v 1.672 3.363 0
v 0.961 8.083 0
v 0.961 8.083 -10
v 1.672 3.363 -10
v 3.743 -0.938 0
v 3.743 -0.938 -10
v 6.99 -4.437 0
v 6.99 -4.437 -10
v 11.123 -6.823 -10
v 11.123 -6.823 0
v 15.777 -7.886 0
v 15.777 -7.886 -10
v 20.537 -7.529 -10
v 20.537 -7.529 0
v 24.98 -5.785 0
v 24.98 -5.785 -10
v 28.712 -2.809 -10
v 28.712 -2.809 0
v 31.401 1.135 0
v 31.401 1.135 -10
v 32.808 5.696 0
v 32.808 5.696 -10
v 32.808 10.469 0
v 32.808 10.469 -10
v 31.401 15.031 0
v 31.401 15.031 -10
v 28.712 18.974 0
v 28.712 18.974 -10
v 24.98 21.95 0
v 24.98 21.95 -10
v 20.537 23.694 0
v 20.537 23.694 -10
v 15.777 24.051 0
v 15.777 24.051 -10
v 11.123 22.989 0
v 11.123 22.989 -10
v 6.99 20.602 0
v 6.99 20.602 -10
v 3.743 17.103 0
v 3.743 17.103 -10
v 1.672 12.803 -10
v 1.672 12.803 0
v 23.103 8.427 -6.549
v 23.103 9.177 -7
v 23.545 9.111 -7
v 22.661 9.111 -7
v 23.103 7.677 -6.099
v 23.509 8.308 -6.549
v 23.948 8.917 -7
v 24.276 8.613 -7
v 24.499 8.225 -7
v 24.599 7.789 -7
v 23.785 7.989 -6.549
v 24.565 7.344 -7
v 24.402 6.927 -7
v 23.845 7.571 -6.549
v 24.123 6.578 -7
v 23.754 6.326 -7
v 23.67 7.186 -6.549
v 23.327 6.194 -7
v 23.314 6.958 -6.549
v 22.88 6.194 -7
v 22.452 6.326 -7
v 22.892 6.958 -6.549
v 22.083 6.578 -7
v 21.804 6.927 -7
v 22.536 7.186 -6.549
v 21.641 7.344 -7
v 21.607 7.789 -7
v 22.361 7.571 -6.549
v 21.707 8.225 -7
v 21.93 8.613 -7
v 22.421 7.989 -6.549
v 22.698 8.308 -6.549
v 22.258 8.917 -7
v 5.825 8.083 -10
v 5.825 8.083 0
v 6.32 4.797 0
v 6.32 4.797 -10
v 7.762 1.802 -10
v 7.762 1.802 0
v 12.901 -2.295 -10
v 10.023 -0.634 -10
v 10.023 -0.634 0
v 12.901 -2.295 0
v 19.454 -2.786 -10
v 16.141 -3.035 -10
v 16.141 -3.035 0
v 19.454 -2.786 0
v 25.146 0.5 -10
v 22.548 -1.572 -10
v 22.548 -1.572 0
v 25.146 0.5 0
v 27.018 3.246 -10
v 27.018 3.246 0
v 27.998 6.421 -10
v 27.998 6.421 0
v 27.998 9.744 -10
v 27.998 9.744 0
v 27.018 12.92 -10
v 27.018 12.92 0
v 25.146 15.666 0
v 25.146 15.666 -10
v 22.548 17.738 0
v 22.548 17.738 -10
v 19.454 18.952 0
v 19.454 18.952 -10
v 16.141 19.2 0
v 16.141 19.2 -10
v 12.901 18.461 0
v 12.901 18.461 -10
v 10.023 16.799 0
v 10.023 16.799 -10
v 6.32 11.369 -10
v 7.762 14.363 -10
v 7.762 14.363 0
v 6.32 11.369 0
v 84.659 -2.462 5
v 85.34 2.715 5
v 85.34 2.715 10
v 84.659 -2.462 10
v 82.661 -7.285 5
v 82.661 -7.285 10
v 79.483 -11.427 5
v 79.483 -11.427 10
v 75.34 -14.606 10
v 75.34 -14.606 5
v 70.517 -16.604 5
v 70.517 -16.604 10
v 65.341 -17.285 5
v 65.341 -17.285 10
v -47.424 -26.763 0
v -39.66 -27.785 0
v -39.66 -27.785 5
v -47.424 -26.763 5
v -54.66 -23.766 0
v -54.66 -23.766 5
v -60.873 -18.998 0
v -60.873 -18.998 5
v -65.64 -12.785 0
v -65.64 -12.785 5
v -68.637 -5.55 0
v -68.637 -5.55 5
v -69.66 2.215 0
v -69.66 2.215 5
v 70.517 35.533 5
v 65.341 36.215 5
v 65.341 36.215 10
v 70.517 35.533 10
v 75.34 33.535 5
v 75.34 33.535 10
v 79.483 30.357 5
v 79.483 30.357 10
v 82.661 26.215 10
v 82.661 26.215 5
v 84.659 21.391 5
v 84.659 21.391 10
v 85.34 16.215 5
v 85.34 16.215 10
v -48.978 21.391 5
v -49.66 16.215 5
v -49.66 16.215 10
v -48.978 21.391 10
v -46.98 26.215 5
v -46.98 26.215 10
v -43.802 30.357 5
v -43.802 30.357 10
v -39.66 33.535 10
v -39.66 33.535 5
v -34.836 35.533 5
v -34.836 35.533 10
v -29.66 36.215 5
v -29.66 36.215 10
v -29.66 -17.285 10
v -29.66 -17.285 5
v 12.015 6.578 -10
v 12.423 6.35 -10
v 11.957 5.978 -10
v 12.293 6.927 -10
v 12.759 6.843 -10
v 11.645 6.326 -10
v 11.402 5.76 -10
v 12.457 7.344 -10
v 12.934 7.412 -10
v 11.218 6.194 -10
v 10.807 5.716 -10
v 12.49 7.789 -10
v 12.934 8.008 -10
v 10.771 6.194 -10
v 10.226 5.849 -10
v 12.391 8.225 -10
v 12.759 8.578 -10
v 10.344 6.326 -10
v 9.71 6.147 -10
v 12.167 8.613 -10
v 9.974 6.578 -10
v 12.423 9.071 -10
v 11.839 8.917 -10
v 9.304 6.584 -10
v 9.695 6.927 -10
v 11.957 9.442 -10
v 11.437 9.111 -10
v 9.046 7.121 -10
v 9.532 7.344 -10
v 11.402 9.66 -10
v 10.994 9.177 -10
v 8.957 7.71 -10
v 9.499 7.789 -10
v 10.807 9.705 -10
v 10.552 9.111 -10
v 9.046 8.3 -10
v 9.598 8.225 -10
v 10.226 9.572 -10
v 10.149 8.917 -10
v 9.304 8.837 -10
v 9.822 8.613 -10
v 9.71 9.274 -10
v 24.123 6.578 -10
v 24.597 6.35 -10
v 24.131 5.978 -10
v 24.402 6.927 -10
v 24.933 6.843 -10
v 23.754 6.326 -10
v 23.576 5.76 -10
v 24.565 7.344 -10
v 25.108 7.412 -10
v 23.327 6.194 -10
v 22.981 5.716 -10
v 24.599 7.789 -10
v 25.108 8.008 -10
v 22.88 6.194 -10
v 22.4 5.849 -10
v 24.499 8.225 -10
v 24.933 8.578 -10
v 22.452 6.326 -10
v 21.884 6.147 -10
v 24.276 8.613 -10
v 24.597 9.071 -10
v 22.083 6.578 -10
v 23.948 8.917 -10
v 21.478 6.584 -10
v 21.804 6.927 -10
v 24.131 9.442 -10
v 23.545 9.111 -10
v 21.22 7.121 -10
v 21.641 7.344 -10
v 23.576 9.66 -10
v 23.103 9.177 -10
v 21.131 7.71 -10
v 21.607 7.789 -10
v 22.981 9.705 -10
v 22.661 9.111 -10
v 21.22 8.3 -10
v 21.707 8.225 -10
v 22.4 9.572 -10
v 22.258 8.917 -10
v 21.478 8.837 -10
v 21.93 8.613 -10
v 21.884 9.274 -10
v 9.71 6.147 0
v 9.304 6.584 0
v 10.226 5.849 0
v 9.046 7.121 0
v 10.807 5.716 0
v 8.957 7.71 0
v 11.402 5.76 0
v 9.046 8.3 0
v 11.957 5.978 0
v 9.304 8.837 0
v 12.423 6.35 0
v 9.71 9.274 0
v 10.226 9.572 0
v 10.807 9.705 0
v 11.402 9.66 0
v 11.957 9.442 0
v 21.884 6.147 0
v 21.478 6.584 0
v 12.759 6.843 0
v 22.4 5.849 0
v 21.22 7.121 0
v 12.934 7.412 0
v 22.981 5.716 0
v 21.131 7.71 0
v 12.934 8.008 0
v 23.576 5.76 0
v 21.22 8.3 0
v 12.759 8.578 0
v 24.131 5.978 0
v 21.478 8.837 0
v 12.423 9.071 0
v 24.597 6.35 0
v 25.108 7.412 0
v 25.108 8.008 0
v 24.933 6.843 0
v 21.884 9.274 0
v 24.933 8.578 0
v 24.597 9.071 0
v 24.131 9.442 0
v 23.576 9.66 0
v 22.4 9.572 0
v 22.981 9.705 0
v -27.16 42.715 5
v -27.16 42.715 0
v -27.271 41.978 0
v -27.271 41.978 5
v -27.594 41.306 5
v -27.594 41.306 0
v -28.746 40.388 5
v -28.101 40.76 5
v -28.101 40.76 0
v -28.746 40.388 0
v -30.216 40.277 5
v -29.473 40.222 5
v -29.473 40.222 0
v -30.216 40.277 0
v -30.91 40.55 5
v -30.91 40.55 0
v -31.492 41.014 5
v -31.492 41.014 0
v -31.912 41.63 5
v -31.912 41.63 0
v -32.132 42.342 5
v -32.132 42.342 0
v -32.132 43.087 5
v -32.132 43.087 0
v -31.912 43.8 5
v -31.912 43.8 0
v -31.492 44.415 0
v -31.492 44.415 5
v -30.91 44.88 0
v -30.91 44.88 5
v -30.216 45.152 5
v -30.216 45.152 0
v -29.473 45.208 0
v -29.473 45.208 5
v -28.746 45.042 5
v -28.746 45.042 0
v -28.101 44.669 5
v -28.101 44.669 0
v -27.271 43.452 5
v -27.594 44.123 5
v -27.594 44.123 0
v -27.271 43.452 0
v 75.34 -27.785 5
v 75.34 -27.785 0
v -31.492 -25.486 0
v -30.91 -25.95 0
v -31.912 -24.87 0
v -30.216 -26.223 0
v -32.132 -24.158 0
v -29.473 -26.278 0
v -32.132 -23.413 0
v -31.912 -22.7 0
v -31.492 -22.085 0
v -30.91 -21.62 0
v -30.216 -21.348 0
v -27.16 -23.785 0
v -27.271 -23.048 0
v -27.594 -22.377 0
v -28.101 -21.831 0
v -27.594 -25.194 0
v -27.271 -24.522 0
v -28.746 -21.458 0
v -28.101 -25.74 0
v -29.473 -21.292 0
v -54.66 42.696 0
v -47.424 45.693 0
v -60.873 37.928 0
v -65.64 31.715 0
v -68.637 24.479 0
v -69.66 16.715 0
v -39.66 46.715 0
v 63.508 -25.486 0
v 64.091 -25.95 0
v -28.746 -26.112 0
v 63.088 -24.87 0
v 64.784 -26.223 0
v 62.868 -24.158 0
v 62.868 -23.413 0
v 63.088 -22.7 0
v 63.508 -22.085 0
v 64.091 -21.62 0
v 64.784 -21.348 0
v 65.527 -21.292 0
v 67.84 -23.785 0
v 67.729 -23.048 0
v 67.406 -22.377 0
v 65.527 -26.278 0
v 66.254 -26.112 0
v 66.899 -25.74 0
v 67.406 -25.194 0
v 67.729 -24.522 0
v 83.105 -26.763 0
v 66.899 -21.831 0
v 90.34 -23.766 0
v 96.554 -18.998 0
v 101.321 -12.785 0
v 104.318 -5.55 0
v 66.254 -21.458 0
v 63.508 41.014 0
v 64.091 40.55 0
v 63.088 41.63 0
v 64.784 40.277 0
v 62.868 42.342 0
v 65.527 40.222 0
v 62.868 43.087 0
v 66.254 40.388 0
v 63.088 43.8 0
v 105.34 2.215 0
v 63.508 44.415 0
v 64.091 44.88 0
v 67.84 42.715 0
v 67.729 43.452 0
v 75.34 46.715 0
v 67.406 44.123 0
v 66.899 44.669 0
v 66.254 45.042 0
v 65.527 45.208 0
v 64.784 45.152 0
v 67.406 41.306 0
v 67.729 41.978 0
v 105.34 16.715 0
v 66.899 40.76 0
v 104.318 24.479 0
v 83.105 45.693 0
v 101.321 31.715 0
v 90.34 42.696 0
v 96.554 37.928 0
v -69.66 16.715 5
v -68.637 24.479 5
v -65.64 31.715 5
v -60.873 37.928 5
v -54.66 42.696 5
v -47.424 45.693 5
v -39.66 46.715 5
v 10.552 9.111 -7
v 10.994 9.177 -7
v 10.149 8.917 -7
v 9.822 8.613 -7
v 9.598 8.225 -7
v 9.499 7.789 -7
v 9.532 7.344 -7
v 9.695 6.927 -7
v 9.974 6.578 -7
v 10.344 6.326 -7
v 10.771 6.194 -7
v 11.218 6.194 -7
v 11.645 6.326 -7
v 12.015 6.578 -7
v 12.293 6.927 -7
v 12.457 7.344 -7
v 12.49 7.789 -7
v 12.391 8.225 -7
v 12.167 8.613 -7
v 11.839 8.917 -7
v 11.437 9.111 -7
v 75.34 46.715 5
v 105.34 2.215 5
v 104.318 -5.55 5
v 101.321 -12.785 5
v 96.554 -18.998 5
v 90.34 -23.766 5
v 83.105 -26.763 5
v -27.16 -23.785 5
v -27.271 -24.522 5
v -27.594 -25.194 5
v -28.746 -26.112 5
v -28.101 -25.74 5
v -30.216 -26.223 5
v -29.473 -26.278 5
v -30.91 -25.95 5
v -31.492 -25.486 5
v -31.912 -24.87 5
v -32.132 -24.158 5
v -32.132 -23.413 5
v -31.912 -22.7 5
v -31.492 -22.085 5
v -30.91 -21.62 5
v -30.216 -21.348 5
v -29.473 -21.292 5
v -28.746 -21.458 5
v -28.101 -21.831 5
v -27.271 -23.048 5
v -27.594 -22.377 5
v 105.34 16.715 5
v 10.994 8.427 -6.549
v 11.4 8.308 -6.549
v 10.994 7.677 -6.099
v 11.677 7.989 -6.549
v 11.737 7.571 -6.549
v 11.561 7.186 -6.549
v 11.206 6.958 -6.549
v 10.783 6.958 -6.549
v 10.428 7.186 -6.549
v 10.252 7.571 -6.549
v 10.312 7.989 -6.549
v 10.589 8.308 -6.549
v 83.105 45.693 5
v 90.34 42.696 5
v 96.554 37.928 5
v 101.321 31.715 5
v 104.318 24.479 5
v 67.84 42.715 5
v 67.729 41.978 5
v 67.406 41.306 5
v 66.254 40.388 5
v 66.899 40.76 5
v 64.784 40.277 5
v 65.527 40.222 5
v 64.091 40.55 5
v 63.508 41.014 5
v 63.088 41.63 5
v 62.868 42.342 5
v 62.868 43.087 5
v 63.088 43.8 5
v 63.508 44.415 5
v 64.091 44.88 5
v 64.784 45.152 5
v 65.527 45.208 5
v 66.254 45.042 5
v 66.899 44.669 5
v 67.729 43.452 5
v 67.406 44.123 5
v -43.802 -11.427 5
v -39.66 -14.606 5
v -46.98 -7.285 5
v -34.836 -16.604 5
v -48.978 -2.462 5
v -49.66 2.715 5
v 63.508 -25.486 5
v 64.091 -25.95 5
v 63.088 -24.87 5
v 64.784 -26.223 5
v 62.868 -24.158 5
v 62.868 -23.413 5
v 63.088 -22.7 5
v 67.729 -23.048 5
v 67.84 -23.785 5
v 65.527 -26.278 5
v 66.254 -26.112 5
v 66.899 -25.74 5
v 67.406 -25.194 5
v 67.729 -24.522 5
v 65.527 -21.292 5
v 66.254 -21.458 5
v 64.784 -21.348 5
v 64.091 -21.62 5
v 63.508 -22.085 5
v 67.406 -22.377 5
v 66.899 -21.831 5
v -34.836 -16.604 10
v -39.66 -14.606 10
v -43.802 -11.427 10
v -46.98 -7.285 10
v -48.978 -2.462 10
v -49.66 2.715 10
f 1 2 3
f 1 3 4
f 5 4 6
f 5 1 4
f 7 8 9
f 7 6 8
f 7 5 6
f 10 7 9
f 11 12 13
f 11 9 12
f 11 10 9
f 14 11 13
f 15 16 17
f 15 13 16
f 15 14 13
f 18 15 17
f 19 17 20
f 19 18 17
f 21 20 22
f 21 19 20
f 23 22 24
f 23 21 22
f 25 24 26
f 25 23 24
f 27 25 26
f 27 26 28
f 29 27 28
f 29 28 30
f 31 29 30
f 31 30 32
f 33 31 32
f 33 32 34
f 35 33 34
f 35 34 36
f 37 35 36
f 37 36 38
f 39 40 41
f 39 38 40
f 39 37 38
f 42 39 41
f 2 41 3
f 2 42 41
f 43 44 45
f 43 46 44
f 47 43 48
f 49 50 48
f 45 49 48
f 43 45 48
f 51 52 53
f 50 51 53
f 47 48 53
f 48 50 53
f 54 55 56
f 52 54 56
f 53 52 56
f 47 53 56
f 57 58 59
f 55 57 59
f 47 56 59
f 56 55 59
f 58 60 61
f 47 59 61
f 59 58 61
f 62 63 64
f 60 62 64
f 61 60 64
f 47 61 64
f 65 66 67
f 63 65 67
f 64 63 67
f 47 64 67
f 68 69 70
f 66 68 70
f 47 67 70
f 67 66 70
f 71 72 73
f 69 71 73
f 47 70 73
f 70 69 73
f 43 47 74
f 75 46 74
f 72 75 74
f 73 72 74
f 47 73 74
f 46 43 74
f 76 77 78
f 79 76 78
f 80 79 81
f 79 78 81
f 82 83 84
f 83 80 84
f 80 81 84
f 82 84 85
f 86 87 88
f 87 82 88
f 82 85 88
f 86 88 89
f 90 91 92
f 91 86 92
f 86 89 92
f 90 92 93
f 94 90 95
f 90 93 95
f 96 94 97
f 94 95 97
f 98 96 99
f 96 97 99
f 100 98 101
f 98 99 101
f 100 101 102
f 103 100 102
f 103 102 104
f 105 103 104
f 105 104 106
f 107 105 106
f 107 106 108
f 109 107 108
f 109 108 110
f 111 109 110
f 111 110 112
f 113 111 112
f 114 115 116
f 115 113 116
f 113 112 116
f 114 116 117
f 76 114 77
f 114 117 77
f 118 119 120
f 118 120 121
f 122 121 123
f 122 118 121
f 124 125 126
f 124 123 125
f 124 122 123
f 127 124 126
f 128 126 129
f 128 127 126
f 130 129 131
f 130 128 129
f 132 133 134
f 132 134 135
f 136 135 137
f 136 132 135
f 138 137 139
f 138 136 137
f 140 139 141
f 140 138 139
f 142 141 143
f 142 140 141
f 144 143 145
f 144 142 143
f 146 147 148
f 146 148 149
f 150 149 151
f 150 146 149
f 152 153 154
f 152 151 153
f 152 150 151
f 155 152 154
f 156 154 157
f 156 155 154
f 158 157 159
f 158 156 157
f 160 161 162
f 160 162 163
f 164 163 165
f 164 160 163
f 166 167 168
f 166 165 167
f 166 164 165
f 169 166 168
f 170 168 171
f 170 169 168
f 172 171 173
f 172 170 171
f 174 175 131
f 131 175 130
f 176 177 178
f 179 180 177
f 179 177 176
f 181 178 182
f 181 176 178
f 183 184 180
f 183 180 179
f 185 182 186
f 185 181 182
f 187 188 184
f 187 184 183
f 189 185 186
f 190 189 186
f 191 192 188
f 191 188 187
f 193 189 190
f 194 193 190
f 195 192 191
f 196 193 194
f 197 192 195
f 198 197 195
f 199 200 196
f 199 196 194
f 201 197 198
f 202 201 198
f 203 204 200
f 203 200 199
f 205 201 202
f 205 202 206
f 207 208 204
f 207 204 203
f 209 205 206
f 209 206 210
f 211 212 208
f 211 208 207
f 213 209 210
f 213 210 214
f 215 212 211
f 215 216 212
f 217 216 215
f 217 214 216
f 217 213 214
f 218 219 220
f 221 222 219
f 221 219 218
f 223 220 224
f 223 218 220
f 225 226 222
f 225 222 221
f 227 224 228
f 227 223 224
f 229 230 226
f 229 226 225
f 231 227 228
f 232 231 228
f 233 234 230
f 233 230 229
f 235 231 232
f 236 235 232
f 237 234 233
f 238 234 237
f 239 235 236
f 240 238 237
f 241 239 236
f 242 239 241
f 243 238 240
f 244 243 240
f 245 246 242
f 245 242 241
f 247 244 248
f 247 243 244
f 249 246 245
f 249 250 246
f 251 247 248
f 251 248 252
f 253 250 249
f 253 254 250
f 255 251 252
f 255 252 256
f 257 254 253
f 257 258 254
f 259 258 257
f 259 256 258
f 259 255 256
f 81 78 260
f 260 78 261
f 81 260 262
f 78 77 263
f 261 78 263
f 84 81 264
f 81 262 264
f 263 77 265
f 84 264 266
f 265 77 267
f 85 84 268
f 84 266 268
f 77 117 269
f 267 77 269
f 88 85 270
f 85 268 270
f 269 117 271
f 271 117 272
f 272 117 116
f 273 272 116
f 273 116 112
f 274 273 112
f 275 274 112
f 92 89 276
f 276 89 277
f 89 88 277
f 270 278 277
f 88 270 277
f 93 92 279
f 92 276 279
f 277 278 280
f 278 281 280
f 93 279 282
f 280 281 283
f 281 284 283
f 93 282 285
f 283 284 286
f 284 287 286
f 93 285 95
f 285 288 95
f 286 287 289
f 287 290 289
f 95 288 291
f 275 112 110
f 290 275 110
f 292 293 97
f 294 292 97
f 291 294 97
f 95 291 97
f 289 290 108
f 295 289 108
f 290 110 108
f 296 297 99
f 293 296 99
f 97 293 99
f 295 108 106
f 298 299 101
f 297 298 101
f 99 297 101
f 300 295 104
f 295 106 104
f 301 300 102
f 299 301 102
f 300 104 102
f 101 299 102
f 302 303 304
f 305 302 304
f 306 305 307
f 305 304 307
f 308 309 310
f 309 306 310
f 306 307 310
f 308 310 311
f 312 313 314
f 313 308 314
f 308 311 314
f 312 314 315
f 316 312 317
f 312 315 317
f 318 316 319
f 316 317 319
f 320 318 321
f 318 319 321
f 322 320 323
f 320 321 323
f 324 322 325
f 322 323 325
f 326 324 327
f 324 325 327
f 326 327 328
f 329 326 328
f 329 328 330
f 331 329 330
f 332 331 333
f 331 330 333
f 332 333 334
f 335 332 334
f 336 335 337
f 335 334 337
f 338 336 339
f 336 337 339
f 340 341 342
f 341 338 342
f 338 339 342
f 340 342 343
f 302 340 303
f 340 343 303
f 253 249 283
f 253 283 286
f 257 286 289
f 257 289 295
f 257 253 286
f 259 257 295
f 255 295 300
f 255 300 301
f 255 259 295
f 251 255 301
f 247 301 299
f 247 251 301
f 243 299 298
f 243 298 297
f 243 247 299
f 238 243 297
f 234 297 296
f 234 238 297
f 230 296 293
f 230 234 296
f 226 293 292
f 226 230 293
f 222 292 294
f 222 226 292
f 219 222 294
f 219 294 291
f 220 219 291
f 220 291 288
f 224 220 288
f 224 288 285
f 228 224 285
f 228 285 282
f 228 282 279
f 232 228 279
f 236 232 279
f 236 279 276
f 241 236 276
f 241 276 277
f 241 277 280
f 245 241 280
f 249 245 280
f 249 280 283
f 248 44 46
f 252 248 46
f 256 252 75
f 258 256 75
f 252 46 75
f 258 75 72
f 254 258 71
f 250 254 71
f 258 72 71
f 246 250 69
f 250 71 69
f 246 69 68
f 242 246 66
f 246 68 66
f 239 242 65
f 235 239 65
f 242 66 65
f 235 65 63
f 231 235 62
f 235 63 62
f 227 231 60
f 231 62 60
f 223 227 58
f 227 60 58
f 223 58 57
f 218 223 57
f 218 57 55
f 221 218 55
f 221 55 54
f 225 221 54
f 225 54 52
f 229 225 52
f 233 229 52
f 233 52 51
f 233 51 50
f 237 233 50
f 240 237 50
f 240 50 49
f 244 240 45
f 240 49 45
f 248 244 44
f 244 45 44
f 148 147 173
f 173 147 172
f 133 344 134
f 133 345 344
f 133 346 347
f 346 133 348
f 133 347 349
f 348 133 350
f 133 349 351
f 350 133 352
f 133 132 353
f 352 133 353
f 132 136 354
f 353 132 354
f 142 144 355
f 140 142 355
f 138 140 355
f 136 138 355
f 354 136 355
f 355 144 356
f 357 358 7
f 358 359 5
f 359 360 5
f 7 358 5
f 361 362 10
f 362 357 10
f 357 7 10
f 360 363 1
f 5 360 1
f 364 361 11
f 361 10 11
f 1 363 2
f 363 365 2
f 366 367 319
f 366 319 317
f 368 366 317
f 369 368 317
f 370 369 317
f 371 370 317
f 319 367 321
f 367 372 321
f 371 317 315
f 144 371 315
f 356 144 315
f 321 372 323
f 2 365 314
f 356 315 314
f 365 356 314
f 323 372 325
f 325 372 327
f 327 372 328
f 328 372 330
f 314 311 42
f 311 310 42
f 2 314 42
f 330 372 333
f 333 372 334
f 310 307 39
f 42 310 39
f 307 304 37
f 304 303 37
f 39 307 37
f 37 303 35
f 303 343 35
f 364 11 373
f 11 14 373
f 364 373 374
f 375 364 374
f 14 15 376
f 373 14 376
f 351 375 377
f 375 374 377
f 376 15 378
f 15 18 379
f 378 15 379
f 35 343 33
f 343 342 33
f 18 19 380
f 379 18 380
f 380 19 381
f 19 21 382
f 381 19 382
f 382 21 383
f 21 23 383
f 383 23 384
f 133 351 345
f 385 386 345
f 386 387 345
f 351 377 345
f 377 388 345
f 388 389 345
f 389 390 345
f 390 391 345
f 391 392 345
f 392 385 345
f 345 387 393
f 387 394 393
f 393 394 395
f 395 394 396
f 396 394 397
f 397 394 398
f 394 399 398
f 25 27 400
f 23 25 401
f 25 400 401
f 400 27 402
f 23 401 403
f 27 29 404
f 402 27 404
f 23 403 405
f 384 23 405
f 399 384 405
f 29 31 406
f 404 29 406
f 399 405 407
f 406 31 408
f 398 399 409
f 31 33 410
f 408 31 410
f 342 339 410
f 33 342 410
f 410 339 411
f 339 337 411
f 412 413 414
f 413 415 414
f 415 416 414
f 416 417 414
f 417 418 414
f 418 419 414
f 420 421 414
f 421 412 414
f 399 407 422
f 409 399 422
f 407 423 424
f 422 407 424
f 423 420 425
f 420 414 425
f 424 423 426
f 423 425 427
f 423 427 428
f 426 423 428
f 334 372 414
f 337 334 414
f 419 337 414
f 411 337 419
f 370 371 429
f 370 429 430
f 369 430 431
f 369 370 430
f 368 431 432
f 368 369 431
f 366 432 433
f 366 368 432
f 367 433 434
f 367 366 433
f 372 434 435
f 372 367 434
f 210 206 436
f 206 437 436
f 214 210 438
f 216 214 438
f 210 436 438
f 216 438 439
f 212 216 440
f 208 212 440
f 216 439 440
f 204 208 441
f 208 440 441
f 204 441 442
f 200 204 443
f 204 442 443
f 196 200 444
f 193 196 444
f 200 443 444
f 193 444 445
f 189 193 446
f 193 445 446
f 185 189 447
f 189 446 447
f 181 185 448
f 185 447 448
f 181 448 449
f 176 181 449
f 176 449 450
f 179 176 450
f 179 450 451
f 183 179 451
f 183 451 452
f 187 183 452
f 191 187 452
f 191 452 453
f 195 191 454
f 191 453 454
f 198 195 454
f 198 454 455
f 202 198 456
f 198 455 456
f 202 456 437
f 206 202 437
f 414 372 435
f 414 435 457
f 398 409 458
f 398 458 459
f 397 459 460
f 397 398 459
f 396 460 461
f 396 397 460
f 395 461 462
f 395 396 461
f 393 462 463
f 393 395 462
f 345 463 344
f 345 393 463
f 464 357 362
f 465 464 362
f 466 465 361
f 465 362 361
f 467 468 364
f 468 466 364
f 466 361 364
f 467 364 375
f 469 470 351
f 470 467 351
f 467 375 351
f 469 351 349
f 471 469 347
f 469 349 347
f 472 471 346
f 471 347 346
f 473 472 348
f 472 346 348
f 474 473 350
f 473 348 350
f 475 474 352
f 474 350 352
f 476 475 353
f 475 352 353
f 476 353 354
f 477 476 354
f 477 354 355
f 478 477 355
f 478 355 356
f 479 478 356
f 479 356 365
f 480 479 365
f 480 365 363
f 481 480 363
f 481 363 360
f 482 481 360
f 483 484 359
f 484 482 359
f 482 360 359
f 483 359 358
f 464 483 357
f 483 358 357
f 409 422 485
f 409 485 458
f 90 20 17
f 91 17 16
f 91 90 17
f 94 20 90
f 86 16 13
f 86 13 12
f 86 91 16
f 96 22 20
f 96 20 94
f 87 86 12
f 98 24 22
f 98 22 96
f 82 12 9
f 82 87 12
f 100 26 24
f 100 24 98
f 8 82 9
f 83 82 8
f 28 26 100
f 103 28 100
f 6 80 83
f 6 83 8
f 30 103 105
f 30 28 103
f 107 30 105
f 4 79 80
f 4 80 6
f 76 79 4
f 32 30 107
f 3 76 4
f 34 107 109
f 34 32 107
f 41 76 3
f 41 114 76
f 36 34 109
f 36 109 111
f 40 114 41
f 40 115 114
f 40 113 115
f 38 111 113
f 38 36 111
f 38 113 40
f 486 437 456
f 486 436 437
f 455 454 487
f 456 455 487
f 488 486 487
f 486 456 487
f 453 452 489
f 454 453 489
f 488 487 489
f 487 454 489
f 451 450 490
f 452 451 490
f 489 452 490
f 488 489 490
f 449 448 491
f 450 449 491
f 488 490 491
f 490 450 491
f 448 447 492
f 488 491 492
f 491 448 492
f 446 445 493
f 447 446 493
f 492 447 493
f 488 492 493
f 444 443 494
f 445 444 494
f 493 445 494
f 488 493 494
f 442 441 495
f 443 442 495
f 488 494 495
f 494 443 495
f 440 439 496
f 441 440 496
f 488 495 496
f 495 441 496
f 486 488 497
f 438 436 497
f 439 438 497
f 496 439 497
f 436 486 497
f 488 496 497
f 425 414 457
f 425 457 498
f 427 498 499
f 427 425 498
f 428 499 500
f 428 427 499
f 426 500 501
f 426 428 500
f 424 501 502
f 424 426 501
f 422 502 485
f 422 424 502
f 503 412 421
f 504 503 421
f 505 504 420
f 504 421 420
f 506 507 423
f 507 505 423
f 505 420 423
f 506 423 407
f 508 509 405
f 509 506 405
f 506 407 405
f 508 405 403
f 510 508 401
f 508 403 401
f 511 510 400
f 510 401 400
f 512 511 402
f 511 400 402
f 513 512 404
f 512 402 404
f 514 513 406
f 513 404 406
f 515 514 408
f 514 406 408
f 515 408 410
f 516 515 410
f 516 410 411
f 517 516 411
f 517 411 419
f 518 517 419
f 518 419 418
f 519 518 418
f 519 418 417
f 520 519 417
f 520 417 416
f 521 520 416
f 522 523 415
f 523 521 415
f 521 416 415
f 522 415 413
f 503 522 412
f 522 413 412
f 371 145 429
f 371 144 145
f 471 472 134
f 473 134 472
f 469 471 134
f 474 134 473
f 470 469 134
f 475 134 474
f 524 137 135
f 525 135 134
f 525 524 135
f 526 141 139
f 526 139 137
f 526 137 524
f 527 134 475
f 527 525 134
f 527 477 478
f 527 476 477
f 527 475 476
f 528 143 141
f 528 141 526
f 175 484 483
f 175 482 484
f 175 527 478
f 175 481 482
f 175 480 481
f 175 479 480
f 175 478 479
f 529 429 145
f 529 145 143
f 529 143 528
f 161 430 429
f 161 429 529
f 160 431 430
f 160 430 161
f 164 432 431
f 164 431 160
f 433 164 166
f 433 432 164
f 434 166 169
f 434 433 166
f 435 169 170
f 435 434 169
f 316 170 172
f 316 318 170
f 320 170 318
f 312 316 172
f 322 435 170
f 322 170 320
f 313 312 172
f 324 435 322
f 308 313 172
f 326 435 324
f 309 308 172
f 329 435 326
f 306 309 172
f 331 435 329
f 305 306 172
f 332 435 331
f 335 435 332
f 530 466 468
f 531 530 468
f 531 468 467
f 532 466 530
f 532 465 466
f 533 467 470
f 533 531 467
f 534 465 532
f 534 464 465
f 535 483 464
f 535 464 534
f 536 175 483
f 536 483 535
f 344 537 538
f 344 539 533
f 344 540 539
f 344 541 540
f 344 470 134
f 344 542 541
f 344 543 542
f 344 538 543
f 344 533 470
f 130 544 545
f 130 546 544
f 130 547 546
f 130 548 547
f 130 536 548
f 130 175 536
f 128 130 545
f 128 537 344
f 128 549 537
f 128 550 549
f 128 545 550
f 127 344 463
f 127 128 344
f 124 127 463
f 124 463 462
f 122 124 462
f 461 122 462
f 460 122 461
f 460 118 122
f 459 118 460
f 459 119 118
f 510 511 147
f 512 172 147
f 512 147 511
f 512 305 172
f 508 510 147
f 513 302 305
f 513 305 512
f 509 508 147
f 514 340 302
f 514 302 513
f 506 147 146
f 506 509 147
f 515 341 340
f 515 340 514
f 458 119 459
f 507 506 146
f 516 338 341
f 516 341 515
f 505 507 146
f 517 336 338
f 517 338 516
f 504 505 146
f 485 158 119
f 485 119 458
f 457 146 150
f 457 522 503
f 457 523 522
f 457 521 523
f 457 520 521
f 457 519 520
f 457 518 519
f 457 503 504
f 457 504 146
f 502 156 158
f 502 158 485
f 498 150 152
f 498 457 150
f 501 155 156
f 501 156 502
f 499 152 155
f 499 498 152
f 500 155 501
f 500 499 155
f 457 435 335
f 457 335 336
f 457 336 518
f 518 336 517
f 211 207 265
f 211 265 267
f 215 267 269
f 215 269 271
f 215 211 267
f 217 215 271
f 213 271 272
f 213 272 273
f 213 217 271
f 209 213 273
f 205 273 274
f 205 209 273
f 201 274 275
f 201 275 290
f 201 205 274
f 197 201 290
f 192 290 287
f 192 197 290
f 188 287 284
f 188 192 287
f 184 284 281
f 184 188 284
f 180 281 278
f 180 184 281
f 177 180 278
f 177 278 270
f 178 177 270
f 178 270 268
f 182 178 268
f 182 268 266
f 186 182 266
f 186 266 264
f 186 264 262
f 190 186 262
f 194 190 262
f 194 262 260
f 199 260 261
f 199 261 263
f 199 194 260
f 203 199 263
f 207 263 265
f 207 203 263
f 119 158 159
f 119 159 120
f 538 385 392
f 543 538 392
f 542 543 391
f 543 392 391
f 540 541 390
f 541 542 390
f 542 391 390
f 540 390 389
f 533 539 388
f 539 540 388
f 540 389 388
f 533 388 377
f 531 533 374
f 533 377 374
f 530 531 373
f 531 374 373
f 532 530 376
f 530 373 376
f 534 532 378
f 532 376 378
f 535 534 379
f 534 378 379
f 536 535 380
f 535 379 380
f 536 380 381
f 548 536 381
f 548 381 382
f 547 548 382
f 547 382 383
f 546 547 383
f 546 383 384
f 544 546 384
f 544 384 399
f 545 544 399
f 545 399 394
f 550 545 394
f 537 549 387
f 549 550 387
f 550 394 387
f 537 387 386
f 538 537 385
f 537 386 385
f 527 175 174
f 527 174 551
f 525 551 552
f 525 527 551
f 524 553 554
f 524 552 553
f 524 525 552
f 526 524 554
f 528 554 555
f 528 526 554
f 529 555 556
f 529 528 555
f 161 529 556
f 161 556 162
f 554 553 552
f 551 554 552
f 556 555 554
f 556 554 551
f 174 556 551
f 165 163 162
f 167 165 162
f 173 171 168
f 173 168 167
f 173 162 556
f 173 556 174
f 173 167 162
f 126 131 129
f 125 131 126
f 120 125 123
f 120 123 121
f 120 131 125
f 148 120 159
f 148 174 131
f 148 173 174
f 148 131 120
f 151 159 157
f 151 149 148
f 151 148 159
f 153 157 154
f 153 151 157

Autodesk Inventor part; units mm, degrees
ref_plane "YZ Plane" through (0, 0, 0) normal (1, 0, 0) x (0, 1, 0)
ref_plane "XZ Plane" through (0, 0, 0) normal (0, 1, 0) x (-1, 0, 0)
ref_plane "XY Plane" through (0, 0, 0) normal (0, 0, 1) x (1, 0, 0)
sketch "Esboço1" plane through (0, 0, 0) normal (0, 0, 1) x (1, 0, 0)
  line L0 (-29.6595, 42.7148) -> (-29.6595, -23.7852) construction
  line L1 (-29.6595, 42.7148) -> (65.3405, 42.7148) construction
  line L2 (65.3405, 42.7148) -> (65.3405, -23.7852) construction
  line L3 (65.3405, -23.7852) -> (-29.6595, -23.7852) construction
  circle A0 centre (65.3405, 42.7148) radius 2.5
  circle A1 centre (65.3405, -23.7852) radius 2.5
  circle A2 centre (-29.6595, 42.7148) radius 2.5
  circle A3 centre (-29.6595, -23.7852) radius 2.5
  line L4 (65.3405, 42.7148) -> (65.3405, 46.7148) construction
  line L5 (65.3405, 46.7148) -> (-29.6595, 46.7148) construction
  line L6 (-29.6595, 46.7148) -> (-29.6595, 42.7148) construction
  line L7 (65.3405, -23.7852) -> (65.3405, -27.7852) construction
  line L8 (65.3405, -27.7852) -> (-29.6595, -27.7852) construction
  line L9 (-29.6595, -27.7852) -> (-29.6595, -23.7852) construction
  line L10 (17.8405, 42.7148) -> (-37.1595, 42.7148) construction
  line L11 (17.8405, 42.7148) -> (72.8405, 42.7148) construction
  line L12 (17.8405, -23.7852) -> (-47.1595, -23.7852) construction
  line L13 (17.8405, -23.7852) -> (62.8405, -23.7852) construction
  line L14 (-29.6595, 46.7148) -> (-69.6595, 46.7148) construction
  line L15 (65.3405, -27.7852) -> (105.3405, -27.7852) construction
  line L16 (-39.6595, 46.7148) -> (75.3405, 46.7148)
  line L17 (105.3405, 16.7148) -> (105.3405, 2.2148)
  line L18 (75.3405, -27.7852) -> (-39.6595, -27.7852)
  line L19 (-69.6595, 2.2148) -> (-69.6595, 16.7148)
  arc A4 (-39.6595, 46.7148) -> (-69.6595, 16.7148) centre (-39.6595, 16.7148) ccw
  arc A5 (-69.6595, 2.2148) -> (-39.6595, -27.7852) centre (-39.6595, 2.2148) ccw
  arc A6 (105.3405, 16.7148) -> (75.3405, 46.7148) centre (75.3405, 16.7148) ccw
  arc A7 (75.3405, -27.7852) -> (105.3405, 2.2148) centre (75.3405, 2.2148) ccw
  dimension "d16" = 66.5
  dimension "d19" = 5
  dimension "d20" = 4
  dimension "d21" = 4
  dimension "d22" = 55
  dimension "d23" = 55
  dimension "d24" = 40
  dimension "d25" = 40
  dimension "d26" = 30
  dimension "d27" = 30
extrude "Extrusão1" add sketch "Esboço1" along normal blind 5
sketch "Esboço2" plane through (0, 0, 5) normal (0, 0, 1) x (1, 0, 0)
  circle A0 centre (-29.6595, 42.7148) radius 2.5 construction
  line L0 (-29.6595, 40.2148) -> (-29.6595, 36.2148) construction
  circle A1 centre (65.3405, -23.7852) radius 2.5 construction
  line L1 (65.3405, -21.2852) -> (65.3405, -17.2852) construction
  line L2 (-29.6595, 36.2148) -> (-29.6595, 36.2148) construction
  line L3 (65.3405, -17.2852) -> (65.3405, -17.2852) construction
  line L4 (85.3405, 16.2148) -> (85.3405, 2.7148)
  line L5 (-49.6595, 2.7148) -> (-49.6595, 16.2148)
  arc A2 (-29.6595, 36.2148) -> (-49.6595, 16.2148) centre (-29.6595, 16.2148) ccw
  arc A3 (-49.6595, 2.7148) -> (-29.6595, -17.2852) centre (-29.6595, 2.7148) ccw
  arc A4 (85.3405, 16.2148) -> (65.3405, 36.2148) centre (65.3405, 16.2148) ccw
  arc A5 (65.3405, -17.2852) -> (85.3405, 2.7148) centre (65.3405, 2.7148) ccw
  line L6 (65.3405, 36.2148) -> (-29.6595, 36.2148)
  line L7 (-29.6595, -17.2852) -> (65.3405, -17.2852)
  point P0 (0, 0)
  dimension "d34" = 20
extrude "Extrusão2" add sketch "Esboço2" along normal blind 5
sketch "Esboço3" plane through (0, 0, 0) normal (0, 0, -1) x (-1, 0, 0)
  circle A0 centre (-16.9737, 8.0827) radius 16.0131
  circle A1 centre (-16.9737, 8.0827) radius 11.1486
  point P0 (0, 0)
extrude "Extrusão3" add sketch "Esboço3" along normal blind 10
sketch "Esboço4" plane through (16.9737, 8.0827, -10) normal (0, 0, -1) x (-1, 0, 0)
  circle A0 centre (-6.1571, -0.3724) radius 2
  circle A1 centre (6.017, -0.3724) radius 2
  point P0 (16.9737, -8.0827)
  dimension "d39" = 4
sketch "Esboço5" plane through (16.9737, 8.0827, -10) normal (0, 0, -1) x (-1, 0, 0)
  circle A0 centre (-6.1295, -0.4053) radius 1.2064
  circle A1 centre (5.9792, -0.4053) radius 1.3709
  point P0 (16.9737, -8.0827)
extrude "Extrusão4" add sketch "Esboço4" against normal blind 10
hole "Furo1" at (23.1031, 7.6774, -10) at (10.9944, 7.6774, -10) direction (0, 0, 1) diameter 3 depth 3 tip angle 118
sketch "Esboço6" plane through (10.9567, 7.7102, -10) normal (0, 0, -1) x (-1, 0, 0)
  circle A0 centre (0, 0) radius 2 projected
sketch "Esboço7" plane through (23.1307, 7.7102, -10) normal (0, 0, -1) x (-1, 0, 0)
  circle A0 centre (0, 0) radius 2 projected
properties part number "luz de freio"
